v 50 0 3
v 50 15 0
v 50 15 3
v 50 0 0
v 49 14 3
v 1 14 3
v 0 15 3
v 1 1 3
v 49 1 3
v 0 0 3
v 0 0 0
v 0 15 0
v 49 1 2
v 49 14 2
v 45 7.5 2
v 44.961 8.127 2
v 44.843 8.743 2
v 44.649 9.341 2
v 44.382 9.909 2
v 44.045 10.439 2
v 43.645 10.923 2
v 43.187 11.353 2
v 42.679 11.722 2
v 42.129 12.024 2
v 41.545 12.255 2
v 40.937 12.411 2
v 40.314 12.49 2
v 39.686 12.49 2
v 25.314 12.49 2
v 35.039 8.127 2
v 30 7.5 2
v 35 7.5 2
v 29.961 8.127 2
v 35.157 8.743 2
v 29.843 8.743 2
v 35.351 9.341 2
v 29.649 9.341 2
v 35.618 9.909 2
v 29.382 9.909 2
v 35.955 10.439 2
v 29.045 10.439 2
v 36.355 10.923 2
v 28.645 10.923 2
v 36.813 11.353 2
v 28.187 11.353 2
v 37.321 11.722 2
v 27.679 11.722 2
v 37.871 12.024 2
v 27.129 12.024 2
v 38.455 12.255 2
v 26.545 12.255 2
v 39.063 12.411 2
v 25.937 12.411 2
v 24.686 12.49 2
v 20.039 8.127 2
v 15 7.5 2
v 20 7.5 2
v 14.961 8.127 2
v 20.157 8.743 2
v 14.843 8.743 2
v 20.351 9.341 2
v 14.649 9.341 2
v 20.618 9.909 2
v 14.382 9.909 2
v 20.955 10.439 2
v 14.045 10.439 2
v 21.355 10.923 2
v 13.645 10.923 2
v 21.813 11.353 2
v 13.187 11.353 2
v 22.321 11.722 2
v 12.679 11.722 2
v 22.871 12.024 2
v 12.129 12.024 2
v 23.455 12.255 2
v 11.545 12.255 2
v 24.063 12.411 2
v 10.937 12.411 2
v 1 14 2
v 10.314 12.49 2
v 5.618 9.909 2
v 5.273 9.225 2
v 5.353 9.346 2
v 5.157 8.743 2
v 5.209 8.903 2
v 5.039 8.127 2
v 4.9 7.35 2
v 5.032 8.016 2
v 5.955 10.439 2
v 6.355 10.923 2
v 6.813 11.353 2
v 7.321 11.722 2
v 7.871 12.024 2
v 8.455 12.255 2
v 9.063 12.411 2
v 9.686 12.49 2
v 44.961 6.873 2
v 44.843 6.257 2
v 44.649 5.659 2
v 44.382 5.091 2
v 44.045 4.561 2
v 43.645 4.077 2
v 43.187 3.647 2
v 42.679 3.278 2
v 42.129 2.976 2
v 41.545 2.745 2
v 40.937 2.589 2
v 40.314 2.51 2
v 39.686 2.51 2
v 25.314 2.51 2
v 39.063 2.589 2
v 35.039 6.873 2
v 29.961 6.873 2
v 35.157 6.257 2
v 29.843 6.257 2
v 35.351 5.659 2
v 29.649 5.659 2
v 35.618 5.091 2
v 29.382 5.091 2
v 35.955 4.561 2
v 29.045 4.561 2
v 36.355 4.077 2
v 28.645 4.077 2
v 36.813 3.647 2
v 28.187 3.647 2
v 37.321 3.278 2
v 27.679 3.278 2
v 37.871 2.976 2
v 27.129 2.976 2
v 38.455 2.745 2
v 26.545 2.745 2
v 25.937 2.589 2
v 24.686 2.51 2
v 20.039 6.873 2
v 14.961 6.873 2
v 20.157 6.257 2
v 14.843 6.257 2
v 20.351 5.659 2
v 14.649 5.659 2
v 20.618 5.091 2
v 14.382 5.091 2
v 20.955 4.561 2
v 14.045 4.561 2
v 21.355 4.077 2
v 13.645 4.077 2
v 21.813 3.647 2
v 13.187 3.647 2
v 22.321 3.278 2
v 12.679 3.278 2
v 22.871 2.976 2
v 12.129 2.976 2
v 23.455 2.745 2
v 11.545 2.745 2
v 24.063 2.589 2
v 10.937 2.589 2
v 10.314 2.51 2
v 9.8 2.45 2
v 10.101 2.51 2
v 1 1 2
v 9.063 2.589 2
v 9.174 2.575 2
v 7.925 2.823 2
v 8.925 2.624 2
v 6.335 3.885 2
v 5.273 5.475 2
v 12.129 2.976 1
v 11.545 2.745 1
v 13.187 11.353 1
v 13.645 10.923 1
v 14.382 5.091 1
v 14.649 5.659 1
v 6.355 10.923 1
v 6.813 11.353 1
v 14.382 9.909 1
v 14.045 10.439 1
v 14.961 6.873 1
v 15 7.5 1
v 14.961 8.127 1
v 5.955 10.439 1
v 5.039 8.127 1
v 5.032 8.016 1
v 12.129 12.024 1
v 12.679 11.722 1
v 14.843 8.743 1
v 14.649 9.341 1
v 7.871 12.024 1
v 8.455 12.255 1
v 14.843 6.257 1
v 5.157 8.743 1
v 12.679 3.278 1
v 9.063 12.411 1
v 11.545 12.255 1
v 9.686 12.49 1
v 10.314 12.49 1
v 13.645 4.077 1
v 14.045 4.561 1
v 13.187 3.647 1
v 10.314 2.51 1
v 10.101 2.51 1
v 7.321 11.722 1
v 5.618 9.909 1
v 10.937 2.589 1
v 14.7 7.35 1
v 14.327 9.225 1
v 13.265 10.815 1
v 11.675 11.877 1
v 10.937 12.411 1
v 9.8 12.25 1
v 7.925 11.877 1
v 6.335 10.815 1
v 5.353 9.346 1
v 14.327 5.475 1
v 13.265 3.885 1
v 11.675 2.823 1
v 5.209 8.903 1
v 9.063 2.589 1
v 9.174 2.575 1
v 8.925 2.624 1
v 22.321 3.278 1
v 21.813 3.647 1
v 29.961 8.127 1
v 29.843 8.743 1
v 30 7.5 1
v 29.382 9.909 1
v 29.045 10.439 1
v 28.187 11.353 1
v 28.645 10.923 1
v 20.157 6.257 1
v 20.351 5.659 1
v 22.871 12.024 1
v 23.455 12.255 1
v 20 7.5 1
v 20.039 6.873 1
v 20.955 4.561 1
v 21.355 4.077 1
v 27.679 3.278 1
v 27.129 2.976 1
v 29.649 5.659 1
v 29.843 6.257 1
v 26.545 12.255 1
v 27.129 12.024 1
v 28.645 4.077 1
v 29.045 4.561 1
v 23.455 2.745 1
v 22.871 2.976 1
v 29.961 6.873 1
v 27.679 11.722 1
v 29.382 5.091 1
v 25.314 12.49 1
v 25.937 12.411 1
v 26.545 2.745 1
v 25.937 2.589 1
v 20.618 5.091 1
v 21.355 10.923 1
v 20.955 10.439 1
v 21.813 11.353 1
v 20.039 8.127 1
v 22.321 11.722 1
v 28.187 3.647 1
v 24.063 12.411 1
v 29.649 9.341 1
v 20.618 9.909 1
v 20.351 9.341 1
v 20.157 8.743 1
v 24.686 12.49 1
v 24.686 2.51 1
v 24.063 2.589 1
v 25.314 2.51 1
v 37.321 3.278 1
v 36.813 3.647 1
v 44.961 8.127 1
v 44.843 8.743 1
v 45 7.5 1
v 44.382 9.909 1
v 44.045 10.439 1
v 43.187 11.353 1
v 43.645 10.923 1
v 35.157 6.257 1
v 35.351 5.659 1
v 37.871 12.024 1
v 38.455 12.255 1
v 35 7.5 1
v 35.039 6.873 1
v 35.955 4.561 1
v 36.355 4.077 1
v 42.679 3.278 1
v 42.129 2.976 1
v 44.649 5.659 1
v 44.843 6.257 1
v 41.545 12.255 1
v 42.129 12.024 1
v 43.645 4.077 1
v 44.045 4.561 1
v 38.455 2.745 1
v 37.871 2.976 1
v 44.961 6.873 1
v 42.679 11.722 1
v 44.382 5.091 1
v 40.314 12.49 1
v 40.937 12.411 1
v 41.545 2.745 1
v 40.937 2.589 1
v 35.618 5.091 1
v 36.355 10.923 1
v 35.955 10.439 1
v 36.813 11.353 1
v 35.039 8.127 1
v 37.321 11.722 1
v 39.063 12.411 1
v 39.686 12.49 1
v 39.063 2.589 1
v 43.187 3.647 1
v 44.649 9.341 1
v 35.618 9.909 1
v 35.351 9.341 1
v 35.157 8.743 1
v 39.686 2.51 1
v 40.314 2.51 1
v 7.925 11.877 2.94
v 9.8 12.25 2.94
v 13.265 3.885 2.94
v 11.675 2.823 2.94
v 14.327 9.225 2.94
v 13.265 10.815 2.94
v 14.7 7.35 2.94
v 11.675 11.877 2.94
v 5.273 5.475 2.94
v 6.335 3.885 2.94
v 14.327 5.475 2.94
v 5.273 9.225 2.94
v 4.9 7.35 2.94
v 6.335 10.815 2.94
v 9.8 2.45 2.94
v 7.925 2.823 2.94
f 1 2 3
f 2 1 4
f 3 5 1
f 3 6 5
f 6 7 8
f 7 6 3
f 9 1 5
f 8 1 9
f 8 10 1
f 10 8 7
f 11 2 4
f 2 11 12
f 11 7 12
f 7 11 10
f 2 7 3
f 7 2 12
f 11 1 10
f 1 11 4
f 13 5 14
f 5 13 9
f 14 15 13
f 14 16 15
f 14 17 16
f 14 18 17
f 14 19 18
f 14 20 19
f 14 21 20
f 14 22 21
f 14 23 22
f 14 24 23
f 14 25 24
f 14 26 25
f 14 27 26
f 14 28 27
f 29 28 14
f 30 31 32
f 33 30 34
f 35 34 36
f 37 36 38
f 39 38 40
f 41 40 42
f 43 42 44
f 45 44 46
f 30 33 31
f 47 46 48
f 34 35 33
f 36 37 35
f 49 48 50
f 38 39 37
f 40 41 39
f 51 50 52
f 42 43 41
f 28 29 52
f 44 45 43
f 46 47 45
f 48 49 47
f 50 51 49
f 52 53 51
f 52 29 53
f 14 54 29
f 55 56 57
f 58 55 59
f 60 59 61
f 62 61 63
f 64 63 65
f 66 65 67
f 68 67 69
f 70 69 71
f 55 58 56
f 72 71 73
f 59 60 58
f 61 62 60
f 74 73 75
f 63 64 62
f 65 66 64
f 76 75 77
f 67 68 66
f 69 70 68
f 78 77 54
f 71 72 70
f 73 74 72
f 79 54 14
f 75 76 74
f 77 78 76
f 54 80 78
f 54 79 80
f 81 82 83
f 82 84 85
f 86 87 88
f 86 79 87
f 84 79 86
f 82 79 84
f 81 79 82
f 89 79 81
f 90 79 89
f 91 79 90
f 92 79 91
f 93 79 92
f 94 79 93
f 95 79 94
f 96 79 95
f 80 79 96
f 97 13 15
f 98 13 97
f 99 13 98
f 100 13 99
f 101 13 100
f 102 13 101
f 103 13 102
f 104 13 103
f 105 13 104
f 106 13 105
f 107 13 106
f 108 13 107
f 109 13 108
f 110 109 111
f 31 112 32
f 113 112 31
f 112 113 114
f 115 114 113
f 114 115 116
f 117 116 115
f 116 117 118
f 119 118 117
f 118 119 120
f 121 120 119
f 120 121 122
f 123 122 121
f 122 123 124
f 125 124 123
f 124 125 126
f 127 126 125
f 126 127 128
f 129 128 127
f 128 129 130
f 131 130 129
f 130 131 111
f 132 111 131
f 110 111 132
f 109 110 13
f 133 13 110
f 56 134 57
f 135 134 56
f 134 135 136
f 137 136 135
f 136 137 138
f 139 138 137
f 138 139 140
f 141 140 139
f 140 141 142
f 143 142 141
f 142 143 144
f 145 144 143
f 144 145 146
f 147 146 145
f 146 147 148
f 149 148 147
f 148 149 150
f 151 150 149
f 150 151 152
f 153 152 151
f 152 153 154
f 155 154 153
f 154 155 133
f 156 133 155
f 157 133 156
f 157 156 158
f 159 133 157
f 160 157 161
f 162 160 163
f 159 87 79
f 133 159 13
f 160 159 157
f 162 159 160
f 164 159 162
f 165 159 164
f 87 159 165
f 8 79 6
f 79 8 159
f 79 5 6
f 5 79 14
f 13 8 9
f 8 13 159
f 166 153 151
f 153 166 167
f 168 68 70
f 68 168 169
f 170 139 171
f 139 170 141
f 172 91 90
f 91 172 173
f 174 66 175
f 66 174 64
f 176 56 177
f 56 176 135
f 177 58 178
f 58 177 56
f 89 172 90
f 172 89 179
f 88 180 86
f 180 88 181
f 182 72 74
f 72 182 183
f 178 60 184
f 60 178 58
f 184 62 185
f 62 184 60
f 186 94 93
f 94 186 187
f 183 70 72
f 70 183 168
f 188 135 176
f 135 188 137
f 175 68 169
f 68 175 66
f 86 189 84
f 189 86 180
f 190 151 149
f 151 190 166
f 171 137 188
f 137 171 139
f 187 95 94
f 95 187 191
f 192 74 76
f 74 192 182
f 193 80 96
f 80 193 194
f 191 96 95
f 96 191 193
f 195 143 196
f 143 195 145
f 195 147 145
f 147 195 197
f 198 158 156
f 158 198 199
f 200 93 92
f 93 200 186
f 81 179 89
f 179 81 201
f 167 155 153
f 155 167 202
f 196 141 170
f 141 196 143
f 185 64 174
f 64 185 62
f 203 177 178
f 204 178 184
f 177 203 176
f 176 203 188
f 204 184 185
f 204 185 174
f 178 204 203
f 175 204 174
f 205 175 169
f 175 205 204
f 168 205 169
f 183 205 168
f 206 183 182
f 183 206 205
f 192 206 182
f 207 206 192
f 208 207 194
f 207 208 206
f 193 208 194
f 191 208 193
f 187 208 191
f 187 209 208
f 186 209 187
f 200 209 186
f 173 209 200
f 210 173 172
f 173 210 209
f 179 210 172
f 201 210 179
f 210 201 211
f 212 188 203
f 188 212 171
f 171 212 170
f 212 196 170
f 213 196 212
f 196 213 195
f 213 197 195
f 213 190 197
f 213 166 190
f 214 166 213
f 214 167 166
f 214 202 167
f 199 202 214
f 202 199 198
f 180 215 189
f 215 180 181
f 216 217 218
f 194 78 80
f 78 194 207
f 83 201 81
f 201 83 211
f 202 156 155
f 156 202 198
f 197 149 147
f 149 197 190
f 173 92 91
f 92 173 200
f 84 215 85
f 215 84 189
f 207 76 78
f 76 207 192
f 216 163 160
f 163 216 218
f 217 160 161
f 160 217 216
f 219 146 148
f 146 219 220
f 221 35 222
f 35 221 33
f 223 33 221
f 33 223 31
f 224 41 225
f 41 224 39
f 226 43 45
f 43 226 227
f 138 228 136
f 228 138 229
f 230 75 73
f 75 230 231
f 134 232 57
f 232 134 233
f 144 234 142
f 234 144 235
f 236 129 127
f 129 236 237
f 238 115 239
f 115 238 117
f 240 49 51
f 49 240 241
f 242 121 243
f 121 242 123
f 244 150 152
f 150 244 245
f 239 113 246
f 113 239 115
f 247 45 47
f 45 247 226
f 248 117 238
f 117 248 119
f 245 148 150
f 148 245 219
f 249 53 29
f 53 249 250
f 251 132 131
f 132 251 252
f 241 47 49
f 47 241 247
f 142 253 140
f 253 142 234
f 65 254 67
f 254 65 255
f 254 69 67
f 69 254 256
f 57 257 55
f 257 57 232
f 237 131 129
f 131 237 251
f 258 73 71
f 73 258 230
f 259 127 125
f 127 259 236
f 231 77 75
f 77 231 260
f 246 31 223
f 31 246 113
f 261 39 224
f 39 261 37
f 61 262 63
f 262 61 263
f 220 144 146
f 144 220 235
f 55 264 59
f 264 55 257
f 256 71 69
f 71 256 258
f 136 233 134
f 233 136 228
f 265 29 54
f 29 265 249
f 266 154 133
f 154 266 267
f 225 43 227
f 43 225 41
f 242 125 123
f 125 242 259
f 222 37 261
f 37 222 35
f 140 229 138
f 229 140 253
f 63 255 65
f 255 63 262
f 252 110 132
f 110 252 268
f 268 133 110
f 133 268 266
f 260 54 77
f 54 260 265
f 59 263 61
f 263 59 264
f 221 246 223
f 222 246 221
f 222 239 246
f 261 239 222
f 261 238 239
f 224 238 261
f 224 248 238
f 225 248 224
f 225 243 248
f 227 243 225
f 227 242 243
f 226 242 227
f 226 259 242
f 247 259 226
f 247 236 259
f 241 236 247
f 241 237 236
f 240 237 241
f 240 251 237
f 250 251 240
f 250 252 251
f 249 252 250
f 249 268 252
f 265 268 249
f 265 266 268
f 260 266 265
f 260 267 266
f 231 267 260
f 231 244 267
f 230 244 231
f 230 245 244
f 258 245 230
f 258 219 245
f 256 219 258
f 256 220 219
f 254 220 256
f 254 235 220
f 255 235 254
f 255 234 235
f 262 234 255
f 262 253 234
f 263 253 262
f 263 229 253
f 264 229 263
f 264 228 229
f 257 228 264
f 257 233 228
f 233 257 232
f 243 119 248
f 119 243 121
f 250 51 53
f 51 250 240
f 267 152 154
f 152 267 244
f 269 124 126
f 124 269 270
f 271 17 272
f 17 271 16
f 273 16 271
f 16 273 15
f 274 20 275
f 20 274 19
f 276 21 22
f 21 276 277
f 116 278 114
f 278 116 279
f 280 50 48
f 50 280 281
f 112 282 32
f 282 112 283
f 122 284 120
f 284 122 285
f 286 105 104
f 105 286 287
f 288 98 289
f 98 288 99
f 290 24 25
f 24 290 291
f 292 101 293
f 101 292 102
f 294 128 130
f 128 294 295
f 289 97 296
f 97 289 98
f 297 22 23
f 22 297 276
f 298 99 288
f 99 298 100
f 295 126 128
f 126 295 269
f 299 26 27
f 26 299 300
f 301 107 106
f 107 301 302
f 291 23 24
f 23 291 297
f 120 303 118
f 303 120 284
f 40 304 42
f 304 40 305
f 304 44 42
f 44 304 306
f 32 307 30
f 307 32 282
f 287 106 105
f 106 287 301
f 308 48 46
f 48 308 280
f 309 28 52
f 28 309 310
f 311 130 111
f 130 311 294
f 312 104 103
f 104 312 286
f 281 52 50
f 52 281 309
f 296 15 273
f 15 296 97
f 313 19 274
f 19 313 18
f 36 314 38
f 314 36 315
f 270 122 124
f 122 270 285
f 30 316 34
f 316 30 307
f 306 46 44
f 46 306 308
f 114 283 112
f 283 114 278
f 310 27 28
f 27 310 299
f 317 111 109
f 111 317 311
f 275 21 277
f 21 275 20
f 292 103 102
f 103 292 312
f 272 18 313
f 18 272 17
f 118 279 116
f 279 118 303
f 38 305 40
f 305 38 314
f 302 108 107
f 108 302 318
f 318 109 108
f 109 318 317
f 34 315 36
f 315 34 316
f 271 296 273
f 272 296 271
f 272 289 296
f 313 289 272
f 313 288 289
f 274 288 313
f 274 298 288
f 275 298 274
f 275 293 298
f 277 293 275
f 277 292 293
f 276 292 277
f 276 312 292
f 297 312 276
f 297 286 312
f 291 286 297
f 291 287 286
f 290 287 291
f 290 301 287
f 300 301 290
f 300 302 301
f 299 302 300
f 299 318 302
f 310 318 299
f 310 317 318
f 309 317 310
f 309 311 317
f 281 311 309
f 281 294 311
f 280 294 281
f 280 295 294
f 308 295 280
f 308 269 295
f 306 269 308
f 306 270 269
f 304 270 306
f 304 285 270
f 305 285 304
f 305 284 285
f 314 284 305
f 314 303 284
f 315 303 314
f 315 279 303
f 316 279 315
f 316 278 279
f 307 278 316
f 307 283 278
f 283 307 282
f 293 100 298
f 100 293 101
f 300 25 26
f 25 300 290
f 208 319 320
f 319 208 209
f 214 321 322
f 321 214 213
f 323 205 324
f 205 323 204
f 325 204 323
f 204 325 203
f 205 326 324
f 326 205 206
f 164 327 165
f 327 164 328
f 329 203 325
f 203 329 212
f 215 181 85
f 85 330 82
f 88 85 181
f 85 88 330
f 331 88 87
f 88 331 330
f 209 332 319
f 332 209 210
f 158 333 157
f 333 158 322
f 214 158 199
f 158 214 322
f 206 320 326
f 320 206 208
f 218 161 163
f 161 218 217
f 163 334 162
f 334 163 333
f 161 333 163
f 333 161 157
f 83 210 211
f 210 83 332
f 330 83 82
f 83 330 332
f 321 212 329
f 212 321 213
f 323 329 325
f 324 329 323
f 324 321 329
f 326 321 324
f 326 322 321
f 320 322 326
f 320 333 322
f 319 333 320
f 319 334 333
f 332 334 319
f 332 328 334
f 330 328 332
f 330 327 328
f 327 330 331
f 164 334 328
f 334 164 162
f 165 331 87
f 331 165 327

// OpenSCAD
module abzeichen () {
    $fn = 50;
    offset= 10;
    rad=5;
    raum = 5;
    difference() {
        cube([50,15,3]);
        translate([1,1,2])
        cube([48,13,2]);
        translate([0*rad+offset+0*raum,7.5,1])
        cylinder(r=rad,h=3);
        translate([2*rad+offset+1*raum,7.5,1])
        cylinder(r=rad,h=3);
        translate([4*rad+offset+2*raum,7.5,1])
        cylinder(r=rad,h=3);
    }
};

module nippel() {
    offset= 10;
    rad=5;
    raum = 5;
    translate([0*rad+offset+0*raum,7.5,1])
    cylinder(r=rad,h=2);
};

abzeichen();



scale (0.98) nippel();
